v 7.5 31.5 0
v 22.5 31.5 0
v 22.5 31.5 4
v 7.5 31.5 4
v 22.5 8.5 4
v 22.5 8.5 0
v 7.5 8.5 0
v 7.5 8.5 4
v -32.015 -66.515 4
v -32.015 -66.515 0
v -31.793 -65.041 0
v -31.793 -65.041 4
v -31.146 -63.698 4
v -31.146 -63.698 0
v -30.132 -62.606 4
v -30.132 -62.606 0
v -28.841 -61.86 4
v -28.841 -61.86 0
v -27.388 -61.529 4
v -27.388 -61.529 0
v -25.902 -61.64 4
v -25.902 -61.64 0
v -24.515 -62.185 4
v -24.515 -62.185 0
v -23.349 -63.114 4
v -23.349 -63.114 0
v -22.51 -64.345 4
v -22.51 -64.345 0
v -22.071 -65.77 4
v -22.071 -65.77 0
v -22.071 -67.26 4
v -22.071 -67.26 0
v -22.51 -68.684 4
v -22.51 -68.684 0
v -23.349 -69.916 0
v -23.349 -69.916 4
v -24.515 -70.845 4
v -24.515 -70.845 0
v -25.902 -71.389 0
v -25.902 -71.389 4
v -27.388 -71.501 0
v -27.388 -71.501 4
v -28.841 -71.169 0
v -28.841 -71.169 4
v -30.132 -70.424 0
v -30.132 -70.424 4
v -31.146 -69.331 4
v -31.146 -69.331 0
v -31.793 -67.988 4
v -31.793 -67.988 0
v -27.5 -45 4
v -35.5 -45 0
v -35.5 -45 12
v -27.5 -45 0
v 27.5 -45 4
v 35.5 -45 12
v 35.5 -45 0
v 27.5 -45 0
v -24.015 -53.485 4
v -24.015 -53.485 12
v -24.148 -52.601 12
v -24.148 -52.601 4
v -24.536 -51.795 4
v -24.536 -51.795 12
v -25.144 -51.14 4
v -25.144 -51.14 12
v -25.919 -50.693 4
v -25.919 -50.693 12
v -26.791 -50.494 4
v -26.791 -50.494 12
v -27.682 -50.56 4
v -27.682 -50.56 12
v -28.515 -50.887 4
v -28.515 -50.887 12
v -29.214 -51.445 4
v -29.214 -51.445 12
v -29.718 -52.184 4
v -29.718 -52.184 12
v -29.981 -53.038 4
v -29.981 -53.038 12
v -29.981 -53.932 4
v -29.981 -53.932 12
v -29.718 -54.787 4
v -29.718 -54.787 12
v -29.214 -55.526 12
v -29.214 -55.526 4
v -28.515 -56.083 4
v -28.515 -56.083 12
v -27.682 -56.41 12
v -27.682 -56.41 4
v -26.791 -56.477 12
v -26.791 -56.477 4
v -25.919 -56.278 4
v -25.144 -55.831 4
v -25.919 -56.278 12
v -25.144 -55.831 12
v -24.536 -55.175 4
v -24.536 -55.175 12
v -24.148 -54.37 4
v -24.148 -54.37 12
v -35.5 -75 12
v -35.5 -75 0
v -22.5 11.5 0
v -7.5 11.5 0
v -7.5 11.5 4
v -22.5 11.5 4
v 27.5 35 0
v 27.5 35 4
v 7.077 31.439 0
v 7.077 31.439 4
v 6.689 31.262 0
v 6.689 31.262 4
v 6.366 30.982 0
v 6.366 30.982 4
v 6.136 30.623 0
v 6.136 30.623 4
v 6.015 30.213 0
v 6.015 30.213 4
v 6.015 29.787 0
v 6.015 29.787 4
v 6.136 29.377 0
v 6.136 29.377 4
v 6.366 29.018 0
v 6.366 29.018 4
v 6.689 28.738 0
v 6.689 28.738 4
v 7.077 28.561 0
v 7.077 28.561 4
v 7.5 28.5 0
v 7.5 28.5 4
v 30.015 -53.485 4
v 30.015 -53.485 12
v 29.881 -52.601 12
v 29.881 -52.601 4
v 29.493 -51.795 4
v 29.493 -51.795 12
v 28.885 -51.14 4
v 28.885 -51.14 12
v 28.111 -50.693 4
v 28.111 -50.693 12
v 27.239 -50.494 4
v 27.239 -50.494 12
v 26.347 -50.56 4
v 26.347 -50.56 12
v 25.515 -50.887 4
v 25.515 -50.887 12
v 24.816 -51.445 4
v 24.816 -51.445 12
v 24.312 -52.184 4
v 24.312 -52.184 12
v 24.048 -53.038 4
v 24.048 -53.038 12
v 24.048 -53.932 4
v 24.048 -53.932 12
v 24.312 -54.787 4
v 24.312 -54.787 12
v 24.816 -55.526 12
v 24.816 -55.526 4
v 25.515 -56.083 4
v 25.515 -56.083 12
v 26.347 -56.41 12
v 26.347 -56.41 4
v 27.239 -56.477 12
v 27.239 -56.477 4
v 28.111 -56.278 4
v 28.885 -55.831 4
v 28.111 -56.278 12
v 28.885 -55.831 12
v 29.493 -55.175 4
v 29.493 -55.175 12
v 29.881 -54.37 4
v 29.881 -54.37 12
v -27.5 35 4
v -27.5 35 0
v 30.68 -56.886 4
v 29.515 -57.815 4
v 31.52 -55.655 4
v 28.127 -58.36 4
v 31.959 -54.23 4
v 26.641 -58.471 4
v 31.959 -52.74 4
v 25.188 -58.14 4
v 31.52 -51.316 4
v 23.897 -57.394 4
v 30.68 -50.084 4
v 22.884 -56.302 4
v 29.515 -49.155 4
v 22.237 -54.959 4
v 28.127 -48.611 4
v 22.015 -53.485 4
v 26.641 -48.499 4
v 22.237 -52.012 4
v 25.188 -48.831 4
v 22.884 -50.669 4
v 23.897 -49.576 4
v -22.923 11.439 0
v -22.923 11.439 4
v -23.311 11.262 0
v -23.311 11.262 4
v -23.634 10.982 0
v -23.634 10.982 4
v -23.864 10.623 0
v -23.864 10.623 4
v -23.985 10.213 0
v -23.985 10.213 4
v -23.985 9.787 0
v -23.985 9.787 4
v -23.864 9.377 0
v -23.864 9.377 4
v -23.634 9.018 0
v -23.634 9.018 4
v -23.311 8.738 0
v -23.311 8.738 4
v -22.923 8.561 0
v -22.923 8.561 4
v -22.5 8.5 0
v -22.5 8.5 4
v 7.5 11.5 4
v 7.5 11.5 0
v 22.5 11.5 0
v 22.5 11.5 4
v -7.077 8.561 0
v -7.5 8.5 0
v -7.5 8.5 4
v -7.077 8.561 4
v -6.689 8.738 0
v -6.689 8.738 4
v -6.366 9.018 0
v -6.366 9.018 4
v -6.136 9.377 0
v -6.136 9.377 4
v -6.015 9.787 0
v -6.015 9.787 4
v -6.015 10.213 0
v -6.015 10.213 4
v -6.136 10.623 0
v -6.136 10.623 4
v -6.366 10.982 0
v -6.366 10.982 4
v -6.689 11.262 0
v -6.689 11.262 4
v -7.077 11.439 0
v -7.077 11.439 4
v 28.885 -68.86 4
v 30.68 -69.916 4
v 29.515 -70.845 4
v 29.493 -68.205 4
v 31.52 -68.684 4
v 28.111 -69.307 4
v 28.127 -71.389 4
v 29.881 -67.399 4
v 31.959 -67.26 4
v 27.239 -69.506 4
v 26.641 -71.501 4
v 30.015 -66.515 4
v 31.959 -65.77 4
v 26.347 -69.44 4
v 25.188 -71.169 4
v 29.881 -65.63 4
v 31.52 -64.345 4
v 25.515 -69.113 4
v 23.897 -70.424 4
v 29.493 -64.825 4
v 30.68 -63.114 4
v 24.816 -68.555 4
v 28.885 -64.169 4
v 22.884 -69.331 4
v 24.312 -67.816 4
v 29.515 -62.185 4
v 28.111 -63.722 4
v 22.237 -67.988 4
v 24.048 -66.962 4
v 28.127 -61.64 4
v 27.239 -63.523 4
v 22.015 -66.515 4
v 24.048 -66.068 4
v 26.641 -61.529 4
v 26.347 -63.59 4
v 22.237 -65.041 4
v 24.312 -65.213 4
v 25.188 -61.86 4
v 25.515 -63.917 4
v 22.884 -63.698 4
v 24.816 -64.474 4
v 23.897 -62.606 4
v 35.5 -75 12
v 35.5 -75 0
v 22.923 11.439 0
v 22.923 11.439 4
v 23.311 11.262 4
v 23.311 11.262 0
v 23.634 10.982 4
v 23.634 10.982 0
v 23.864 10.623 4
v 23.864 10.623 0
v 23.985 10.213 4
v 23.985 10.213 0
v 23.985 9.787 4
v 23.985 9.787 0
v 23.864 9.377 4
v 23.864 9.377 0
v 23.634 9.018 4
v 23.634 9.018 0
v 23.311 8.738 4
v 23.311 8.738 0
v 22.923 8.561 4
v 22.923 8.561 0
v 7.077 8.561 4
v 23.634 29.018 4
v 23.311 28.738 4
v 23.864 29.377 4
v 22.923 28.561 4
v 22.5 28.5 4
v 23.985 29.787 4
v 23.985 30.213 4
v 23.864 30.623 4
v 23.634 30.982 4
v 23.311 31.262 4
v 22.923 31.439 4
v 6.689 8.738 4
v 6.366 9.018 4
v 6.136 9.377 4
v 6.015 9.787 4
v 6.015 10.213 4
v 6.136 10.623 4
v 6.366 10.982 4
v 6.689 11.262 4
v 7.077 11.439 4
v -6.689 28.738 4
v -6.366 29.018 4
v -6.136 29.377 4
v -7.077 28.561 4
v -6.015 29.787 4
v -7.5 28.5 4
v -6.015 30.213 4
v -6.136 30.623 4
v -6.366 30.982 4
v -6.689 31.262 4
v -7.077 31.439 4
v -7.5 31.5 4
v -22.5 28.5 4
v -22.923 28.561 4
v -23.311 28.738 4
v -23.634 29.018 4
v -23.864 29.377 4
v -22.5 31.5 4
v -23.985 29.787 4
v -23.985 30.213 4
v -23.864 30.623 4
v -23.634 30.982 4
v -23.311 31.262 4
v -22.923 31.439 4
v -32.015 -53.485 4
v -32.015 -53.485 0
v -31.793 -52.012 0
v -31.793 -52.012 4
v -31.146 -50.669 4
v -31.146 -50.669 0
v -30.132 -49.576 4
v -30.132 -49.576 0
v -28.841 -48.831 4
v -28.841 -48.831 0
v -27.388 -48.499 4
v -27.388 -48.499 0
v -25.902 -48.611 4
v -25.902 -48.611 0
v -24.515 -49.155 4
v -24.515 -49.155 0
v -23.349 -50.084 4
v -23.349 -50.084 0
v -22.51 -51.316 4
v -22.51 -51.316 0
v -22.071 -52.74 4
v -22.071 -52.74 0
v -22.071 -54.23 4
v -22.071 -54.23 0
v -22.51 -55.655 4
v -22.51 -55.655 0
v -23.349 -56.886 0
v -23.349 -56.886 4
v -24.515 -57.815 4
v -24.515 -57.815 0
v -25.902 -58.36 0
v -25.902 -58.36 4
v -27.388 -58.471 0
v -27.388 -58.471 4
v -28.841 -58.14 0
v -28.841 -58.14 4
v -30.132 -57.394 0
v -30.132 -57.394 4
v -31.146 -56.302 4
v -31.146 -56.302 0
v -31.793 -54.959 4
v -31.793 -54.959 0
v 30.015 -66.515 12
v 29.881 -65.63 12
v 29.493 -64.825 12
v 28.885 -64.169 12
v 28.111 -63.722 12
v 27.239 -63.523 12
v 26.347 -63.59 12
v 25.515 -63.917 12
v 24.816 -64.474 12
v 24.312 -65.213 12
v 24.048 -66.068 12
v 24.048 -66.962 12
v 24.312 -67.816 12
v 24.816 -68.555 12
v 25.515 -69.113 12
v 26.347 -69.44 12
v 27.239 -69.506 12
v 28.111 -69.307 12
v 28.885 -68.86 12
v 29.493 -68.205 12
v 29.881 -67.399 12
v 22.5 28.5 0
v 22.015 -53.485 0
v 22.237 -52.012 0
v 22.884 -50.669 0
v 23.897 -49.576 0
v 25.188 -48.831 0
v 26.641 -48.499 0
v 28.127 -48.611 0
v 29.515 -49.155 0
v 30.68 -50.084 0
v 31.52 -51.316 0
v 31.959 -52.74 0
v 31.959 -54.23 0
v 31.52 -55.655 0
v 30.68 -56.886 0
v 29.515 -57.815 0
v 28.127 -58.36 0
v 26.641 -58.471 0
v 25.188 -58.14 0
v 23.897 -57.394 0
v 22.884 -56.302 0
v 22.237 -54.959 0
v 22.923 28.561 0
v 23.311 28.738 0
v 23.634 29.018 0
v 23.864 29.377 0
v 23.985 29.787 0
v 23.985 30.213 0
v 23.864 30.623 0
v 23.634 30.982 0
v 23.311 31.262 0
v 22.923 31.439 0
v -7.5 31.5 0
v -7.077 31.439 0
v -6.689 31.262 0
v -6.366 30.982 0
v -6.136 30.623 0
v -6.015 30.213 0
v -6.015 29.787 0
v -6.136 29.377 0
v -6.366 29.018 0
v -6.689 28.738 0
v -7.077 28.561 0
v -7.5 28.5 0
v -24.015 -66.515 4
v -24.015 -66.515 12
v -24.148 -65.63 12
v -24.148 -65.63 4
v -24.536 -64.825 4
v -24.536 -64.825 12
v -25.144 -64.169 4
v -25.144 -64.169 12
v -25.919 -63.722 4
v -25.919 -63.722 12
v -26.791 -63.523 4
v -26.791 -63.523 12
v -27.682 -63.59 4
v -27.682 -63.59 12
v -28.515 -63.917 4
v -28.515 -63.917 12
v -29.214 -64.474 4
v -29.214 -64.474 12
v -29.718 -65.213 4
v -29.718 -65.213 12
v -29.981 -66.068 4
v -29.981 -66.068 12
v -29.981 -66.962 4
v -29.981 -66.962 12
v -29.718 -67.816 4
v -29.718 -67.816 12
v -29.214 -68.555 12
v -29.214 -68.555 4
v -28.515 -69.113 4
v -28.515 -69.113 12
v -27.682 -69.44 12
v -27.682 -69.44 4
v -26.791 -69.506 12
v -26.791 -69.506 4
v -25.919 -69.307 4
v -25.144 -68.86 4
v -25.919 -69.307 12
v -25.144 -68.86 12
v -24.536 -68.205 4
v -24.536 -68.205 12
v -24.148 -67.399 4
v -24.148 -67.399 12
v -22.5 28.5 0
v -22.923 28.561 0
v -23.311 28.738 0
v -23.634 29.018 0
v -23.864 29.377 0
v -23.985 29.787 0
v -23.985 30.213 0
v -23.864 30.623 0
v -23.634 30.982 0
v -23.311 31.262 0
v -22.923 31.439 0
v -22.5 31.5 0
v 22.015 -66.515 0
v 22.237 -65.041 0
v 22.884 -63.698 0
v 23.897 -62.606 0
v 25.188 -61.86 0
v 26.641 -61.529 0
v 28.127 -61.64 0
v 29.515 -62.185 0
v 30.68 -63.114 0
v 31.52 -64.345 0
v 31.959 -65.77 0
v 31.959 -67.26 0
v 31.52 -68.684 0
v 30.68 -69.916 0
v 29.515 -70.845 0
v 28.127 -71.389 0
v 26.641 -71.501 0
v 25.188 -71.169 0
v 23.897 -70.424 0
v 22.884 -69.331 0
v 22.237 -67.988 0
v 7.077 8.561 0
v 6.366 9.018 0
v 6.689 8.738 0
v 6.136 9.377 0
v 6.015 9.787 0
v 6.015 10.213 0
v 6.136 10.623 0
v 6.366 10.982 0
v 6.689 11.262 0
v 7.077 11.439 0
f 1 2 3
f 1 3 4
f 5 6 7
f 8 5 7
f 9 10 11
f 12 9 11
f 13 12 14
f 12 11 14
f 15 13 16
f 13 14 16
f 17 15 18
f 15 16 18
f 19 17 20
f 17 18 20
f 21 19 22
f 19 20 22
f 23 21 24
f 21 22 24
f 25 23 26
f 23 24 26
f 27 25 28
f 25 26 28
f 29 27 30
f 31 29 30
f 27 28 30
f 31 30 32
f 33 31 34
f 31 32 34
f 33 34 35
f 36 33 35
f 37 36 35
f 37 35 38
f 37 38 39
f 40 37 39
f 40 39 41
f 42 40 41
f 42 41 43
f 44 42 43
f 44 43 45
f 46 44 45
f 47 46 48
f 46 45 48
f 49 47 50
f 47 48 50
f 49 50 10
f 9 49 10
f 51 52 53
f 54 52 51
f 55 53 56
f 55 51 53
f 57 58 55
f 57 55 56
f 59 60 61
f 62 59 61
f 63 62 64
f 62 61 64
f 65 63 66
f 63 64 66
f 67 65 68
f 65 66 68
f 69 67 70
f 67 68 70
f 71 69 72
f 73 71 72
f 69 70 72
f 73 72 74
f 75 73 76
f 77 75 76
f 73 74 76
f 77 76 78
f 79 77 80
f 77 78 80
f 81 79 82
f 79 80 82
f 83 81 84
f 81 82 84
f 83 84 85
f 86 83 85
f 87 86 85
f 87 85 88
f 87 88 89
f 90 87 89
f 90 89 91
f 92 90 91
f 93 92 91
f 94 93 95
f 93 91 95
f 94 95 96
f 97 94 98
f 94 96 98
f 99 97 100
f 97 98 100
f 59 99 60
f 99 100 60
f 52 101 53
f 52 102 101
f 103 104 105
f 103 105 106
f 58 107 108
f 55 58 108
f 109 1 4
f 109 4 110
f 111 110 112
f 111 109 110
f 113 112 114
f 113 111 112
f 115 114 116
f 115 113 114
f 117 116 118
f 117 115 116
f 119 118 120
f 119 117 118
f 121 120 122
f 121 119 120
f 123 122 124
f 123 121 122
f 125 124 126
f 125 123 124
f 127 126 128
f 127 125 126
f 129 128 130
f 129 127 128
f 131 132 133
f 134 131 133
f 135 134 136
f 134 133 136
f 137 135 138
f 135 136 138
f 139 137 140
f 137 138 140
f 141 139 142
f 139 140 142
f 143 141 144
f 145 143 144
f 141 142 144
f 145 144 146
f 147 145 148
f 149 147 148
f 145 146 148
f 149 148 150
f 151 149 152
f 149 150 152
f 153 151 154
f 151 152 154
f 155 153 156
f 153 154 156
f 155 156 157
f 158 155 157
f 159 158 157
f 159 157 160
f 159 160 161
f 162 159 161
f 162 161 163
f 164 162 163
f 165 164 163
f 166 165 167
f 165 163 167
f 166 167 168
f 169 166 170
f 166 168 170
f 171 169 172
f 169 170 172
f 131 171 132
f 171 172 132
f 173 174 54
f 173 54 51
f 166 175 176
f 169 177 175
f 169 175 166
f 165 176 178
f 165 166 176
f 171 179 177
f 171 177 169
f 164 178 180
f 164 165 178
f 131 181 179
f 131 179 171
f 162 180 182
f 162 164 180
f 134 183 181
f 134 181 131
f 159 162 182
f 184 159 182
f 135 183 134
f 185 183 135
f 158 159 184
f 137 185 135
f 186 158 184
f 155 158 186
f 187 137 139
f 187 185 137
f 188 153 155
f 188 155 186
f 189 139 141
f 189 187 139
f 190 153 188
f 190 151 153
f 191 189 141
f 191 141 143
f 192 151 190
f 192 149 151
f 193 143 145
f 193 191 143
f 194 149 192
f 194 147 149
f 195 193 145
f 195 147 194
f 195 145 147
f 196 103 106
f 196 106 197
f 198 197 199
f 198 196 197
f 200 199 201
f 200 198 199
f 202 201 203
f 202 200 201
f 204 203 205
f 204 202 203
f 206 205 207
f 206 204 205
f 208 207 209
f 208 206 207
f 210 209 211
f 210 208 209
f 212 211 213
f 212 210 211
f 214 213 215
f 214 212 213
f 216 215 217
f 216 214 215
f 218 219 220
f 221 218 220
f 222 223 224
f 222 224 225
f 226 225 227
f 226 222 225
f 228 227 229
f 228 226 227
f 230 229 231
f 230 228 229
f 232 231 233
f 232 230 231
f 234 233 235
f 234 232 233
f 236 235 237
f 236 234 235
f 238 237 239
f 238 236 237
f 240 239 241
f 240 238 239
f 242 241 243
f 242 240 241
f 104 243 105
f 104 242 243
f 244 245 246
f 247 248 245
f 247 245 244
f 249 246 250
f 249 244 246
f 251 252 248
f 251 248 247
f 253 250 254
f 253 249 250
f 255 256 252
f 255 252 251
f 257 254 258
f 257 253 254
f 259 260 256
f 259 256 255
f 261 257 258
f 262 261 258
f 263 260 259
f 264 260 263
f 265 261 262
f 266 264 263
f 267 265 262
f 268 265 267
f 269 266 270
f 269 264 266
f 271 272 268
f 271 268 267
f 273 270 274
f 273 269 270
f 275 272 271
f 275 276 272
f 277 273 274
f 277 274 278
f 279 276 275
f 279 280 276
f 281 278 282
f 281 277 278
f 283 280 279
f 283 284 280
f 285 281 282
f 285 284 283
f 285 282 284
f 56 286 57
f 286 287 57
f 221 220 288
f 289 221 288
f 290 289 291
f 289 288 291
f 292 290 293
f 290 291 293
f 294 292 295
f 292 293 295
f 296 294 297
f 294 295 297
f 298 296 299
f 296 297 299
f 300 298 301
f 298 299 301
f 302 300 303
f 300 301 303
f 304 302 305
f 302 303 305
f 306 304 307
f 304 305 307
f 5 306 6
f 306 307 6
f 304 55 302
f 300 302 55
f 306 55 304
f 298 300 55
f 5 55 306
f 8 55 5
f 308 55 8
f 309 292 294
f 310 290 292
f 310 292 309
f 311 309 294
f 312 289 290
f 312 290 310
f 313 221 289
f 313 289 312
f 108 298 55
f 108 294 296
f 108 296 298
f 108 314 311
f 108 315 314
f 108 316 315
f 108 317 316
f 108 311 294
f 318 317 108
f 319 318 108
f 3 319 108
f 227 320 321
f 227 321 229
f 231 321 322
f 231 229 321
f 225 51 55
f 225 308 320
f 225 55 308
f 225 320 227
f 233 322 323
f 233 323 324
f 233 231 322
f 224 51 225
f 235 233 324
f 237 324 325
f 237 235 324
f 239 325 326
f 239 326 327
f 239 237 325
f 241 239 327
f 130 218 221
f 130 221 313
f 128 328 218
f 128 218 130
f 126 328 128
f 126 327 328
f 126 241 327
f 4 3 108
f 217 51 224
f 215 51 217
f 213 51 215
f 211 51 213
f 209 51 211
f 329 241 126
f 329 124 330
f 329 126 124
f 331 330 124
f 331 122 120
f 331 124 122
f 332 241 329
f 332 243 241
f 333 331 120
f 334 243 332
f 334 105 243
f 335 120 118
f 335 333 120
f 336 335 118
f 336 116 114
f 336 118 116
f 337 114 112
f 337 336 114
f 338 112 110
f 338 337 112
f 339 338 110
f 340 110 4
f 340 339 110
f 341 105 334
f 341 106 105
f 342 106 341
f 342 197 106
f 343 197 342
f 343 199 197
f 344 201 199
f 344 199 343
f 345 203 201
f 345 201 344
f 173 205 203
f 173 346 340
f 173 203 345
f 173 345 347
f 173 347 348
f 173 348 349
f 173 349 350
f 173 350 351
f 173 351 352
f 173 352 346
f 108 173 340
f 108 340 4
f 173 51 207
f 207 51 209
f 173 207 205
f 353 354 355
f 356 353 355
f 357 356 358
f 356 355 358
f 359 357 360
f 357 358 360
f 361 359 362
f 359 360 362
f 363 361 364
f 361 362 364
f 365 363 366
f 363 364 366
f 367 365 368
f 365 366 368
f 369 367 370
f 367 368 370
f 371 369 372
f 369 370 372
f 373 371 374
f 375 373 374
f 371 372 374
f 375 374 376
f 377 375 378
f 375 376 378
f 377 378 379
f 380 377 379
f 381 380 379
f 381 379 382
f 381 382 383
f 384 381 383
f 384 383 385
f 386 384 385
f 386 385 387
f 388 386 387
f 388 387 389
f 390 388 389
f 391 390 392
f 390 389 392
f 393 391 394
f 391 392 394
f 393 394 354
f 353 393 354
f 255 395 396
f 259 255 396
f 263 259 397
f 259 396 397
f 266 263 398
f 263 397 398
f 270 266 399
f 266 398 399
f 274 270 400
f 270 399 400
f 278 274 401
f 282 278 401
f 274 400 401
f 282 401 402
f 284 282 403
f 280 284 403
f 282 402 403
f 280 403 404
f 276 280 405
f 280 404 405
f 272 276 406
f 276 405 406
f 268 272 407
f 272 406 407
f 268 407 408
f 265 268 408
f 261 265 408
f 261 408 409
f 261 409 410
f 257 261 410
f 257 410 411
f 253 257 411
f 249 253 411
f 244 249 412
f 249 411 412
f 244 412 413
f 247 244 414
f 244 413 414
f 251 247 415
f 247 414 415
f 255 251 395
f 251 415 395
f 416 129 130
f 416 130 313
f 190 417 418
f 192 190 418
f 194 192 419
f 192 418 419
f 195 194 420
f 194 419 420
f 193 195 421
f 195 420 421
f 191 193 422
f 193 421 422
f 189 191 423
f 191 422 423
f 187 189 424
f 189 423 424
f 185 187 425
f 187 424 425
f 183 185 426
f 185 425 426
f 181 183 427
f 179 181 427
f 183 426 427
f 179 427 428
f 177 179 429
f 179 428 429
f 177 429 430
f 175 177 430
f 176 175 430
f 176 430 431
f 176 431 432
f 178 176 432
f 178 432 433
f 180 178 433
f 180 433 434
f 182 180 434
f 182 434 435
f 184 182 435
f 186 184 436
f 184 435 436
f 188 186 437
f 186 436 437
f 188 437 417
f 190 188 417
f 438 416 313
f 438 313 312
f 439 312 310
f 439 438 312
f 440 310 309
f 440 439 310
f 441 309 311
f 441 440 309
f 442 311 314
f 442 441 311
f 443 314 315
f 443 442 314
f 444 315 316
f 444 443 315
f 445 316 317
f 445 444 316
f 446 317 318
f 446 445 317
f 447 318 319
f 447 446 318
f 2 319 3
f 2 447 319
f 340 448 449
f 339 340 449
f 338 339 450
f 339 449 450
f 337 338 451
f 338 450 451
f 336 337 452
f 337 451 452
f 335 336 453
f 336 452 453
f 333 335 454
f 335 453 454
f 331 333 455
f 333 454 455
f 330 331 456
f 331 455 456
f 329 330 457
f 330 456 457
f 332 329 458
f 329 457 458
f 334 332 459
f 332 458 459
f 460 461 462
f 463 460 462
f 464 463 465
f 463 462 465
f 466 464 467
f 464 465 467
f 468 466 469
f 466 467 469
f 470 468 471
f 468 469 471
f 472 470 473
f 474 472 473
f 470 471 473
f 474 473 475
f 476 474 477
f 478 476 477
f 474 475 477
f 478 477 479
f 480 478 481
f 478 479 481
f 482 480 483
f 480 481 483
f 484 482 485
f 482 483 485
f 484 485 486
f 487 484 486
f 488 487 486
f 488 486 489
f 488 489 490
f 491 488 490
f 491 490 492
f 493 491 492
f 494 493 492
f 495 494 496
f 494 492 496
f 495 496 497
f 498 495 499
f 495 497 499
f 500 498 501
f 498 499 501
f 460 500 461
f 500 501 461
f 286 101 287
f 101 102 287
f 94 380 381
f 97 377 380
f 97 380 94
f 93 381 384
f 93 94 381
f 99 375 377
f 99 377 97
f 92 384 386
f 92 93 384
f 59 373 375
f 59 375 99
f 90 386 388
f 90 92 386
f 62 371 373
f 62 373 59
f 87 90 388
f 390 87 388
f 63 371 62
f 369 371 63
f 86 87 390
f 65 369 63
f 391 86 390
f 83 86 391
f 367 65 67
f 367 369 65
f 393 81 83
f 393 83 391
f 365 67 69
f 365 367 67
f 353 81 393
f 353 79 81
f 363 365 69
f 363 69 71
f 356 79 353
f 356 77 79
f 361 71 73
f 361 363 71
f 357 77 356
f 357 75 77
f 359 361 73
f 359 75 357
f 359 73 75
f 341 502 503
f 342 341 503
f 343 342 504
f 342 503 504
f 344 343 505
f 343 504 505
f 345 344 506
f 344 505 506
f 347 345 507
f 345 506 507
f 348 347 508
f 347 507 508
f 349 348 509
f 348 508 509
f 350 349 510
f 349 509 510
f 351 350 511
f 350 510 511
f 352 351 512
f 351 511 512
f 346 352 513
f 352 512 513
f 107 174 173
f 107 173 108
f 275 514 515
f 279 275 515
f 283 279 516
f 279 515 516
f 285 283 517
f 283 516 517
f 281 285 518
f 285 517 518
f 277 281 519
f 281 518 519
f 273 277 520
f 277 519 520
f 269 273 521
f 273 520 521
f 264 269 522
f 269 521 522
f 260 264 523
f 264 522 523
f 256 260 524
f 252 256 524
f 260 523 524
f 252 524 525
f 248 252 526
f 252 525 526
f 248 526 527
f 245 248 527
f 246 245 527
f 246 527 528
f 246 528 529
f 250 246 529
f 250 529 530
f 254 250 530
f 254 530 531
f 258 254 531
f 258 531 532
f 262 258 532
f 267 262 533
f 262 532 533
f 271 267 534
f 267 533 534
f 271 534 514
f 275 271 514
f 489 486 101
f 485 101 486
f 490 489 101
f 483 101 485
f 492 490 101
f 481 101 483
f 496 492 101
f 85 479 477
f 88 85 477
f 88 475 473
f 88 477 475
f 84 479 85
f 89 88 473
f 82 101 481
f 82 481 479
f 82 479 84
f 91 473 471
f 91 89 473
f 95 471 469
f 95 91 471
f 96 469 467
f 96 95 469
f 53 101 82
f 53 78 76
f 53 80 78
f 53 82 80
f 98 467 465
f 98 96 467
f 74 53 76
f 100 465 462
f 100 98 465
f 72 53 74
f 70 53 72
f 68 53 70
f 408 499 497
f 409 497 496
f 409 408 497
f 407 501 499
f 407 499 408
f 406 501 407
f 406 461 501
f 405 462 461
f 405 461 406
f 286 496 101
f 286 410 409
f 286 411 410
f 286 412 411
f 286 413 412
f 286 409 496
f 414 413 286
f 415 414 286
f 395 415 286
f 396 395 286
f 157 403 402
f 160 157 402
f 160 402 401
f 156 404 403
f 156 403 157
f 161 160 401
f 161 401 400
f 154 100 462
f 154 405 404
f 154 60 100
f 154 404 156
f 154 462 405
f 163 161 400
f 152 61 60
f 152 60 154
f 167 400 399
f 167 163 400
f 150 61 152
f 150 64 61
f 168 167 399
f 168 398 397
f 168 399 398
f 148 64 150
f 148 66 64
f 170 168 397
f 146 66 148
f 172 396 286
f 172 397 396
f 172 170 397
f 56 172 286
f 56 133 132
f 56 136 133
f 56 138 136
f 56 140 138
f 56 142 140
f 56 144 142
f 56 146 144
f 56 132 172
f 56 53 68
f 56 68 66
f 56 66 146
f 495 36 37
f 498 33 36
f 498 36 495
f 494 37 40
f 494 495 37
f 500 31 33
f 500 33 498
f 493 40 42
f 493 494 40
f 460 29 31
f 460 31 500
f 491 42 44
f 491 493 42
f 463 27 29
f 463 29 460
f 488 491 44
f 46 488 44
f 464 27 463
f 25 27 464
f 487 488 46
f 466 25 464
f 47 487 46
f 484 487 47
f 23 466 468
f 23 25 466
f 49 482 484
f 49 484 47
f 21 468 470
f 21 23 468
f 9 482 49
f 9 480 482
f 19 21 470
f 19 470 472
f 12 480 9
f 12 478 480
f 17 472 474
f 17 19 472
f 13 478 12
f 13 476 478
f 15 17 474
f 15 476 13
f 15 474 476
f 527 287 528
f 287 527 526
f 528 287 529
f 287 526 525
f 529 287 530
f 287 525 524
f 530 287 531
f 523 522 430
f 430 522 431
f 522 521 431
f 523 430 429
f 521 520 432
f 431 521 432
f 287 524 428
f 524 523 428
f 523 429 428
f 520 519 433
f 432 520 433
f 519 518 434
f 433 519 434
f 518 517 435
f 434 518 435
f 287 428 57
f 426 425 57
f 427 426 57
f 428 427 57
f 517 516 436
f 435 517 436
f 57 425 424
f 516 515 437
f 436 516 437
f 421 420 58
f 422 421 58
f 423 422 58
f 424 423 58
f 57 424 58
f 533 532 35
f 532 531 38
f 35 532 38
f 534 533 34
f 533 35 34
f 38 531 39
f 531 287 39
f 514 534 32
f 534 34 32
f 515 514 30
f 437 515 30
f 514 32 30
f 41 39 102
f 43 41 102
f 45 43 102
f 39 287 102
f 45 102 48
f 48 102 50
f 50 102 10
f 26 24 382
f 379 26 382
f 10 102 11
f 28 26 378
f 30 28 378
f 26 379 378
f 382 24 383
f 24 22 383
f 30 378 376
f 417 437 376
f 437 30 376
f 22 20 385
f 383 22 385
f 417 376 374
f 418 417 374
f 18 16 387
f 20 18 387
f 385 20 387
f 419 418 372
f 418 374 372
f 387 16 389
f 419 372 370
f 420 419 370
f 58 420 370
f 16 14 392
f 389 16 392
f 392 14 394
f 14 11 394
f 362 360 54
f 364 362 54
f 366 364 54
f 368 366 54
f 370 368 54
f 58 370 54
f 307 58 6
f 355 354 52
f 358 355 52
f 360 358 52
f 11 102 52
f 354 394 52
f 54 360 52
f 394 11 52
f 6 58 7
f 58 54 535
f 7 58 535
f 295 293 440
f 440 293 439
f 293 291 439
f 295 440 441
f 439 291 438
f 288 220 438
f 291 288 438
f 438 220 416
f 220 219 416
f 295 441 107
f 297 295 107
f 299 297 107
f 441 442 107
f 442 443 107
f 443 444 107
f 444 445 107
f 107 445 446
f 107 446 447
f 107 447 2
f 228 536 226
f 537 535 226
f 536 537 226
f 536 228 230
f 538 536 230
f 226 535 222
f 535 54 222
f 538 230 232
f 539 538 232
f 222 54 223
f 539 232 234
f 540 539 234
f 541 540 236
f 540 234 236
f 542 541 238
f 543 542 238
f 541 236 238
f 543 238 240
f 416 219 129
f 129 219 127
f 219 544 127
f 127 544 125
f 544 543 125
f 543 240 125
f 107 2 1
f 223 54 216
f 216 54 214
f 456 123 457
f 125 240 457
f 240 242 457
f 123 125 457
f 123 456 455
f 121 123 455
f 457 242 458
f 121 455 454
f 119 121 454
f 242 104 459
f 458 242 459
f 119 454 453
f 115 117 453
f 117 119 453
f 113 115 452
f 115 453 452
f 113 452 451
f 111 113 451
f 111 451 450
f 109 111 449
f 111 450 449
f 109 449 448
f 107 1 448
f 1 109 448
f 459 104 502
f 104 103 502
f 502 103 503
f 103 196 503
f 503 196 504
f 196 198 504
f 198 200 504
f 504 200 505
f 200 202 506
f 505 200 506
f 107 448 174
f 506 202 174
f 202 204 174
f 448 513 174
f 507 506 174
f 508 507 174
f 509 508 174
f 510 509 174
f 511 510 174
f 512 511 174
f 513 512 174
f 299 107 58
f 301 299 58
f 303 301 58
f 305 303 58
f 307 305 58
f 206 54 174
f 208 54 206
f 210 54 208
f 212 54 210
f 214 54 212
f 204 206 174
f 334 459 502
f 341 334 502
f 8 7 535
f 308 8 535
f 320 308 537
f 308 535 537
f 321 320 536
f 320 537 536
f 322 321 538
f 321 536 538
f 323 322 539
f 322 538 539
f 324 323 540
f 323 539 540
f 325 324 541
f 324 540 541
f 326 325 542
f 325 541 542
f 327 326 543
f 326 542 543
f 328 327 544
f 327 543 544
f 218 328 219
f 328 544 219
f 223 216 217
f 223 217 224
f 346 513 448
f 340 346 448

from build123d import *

# Parameters (mm, degrees)
SKETCH1_W           = 55
SKETCH1_H           = 30
BOSS_EXTRUDE1_DEPTH = 4
SKETCH4_W           = 55
SKETCH4_H           = 4
BOSS_EXTRUDE2_DEPTH = 80
SKETCH5_W           = 4
SKETCH5_H           = 30
BOSS_EXTRUDE3_DEPTH = 8
SKETCH6_W           = 4
SKETCH6_H           = 30
BOSS_EXTRUDE4_DEPTH = 8
SKETCH7_W           = 71
SKETCH7_H           = 30
BOSS_EXTRUDE5_DEPTH = 8
SKETCH9_R           = 3
CUT_EXTRUDE1_DEPTH  = 8
SKETCH8_R           = 5
CUT_EXTRUDE4_DEPTH  = 4


with BuildPart() as part:
    # Sketch1 → Boss-Extrude1 (new body)
    with BuildSketch(Plane.XY):
        with Locations((0, 20)):
            Rectangle(SKETCH1_W, SKETCH1_H)
        with BuildLine():
            Line((22.5, 31.5), (7.5, 31.5))
            ThreePointArc((7.5, 31.5), (6, 30), (7.5, 28.5))
            Line((7.5, 28.5), (22.5, 28.5))
            ThreePointArc((22.5, 28.5), (24, 30), (22.5, 31.5))
        make_face(mode=Mode.SUBTRACT)
        with BuildLine():
            Line((22.5, 8.5), (7.5, 8.5))
            ThreePointArc((7.5, 8.5), (6, 10), (7.5, 11.5))
            Line((7.5, 11.5), (22.5, 11.5))
            ThreePointArc((22.5, 11.5), (24, 10), (22.5, 8.5))
        make_face(mode=Mode.SUBTRACT)
        with BuildLine():
            Line((-22.5, 8.5), (-7.5, 8.5))
            ThreePointArc((-7.5, 8.5), (-6, 10), (-7.5, 11.5))
            Line((-7.5, 11.5), (-22.5, 11.5))
            ThreePointArc((-22.5, 11.5), (-24, 10), (-22.5, 8.5))
        make_face(mode=Mode.SUBTRACT)
        with BuildLine():
            Line((-7.5, 28.5), (-22.5, 28.5))
            ThreePointArc((-22.5, 28.5), (-24, 30), (-22.5, 31.5))
            Line((-22.5, 31.5), (-7.5, 31.5))
            ThreePointArc((-7.5, 31.5), (-6, 30), (-7.5, 28.5))
        make_face(mode=Mode.SUBTRACT)
    extrude(amount=BOSS_EXTRUDE1_DEPTH)

    # Sketch4 → Boss-Extrude2 (add)
    with BuildSketch(Plane.XZ.offset(-5)):
        with Locations((0, 2)):
            Rectangle(SKETCH4_W, SKETCH4_H)
    extrude(amount=BOSS_EXTRUDE2_DEPTH)

    # Sketch5 → Boss-Extrude3 (add)
    with BuildSketch(Plane.ZY.offset(27.5)):
        with Locations((2, -60)):
            Rectangle(SKETCH5_W, SKETCH5_H)
    extrude(amount=BOSS_EXTRUDE3_DEPTH)

    # Sketch6 → Boss-Extrude4 (add)
    with BuildSketch(Plane(origin=(27.5, 0, 0), x_dir=(0, 0, -1), z_dir=(1, 0, 0))):
        with Locations((-2, -60)):
            Rectangle(SKETCH6_W, SKETCH6_H)
    extrude(amount=BOSS_EXTRUDE4_DEPTH)

    # Sketch7 → Boss-Extrude5 (add)
    with BuildSketch(Plane.XY.offset(4)):
        with Locations((0, -60)):
            Rectangle(SKETCH7_W, SKETCH7_H)
    extrude(amount=BOSS_EXTRUDE5_DEPTH)

    # Sketch9 → Cut-Extrude1 (cut)
    with BuildSketch(Plane.XY.offset(12)):
        with Locations((27.014718626, -66.514718626)):
            Circle(SKETCH9_R)
        with Locations((27.014718626, -53.485281374)):
            Circle(SKETCH9_R)
        with Locations((-27.014718626, -53.485281374)):
            Circle(SKETCH9_R)
        with Locations((-27.014718626, -66.514718626)):
            Circle(SKETCH9_R)
    extrude(amount=-CUT_EXTRUDE1_DEPTH, mode=Mode.SUBTRACT)

    # Sketch8 → Cut-Extrude4 (cut)
    with BuildSketch(Plane(origin=(0, 0, 0), x_dir=(-1, 0, 0), z_dir=(0, 0, -1))):
        with Locations((-27.014718626, -53.485281374)):
            Circle(SKETCH8_R)
        with Locations((-27.014718626, -66.514718626)):
            Circle(SKETCH8_R)
        with Locations((27.014718626, -53.485281374)):
            Circle(SKETCH8_R)
        with Locations((27.014718626, -66.514718626)):
            Circle(SKETCH8_R)
    extrude(amount=-CUT_EXTRUDE4_DEPTH, mode=Mode.SUBTRACT)


solid = part.part
